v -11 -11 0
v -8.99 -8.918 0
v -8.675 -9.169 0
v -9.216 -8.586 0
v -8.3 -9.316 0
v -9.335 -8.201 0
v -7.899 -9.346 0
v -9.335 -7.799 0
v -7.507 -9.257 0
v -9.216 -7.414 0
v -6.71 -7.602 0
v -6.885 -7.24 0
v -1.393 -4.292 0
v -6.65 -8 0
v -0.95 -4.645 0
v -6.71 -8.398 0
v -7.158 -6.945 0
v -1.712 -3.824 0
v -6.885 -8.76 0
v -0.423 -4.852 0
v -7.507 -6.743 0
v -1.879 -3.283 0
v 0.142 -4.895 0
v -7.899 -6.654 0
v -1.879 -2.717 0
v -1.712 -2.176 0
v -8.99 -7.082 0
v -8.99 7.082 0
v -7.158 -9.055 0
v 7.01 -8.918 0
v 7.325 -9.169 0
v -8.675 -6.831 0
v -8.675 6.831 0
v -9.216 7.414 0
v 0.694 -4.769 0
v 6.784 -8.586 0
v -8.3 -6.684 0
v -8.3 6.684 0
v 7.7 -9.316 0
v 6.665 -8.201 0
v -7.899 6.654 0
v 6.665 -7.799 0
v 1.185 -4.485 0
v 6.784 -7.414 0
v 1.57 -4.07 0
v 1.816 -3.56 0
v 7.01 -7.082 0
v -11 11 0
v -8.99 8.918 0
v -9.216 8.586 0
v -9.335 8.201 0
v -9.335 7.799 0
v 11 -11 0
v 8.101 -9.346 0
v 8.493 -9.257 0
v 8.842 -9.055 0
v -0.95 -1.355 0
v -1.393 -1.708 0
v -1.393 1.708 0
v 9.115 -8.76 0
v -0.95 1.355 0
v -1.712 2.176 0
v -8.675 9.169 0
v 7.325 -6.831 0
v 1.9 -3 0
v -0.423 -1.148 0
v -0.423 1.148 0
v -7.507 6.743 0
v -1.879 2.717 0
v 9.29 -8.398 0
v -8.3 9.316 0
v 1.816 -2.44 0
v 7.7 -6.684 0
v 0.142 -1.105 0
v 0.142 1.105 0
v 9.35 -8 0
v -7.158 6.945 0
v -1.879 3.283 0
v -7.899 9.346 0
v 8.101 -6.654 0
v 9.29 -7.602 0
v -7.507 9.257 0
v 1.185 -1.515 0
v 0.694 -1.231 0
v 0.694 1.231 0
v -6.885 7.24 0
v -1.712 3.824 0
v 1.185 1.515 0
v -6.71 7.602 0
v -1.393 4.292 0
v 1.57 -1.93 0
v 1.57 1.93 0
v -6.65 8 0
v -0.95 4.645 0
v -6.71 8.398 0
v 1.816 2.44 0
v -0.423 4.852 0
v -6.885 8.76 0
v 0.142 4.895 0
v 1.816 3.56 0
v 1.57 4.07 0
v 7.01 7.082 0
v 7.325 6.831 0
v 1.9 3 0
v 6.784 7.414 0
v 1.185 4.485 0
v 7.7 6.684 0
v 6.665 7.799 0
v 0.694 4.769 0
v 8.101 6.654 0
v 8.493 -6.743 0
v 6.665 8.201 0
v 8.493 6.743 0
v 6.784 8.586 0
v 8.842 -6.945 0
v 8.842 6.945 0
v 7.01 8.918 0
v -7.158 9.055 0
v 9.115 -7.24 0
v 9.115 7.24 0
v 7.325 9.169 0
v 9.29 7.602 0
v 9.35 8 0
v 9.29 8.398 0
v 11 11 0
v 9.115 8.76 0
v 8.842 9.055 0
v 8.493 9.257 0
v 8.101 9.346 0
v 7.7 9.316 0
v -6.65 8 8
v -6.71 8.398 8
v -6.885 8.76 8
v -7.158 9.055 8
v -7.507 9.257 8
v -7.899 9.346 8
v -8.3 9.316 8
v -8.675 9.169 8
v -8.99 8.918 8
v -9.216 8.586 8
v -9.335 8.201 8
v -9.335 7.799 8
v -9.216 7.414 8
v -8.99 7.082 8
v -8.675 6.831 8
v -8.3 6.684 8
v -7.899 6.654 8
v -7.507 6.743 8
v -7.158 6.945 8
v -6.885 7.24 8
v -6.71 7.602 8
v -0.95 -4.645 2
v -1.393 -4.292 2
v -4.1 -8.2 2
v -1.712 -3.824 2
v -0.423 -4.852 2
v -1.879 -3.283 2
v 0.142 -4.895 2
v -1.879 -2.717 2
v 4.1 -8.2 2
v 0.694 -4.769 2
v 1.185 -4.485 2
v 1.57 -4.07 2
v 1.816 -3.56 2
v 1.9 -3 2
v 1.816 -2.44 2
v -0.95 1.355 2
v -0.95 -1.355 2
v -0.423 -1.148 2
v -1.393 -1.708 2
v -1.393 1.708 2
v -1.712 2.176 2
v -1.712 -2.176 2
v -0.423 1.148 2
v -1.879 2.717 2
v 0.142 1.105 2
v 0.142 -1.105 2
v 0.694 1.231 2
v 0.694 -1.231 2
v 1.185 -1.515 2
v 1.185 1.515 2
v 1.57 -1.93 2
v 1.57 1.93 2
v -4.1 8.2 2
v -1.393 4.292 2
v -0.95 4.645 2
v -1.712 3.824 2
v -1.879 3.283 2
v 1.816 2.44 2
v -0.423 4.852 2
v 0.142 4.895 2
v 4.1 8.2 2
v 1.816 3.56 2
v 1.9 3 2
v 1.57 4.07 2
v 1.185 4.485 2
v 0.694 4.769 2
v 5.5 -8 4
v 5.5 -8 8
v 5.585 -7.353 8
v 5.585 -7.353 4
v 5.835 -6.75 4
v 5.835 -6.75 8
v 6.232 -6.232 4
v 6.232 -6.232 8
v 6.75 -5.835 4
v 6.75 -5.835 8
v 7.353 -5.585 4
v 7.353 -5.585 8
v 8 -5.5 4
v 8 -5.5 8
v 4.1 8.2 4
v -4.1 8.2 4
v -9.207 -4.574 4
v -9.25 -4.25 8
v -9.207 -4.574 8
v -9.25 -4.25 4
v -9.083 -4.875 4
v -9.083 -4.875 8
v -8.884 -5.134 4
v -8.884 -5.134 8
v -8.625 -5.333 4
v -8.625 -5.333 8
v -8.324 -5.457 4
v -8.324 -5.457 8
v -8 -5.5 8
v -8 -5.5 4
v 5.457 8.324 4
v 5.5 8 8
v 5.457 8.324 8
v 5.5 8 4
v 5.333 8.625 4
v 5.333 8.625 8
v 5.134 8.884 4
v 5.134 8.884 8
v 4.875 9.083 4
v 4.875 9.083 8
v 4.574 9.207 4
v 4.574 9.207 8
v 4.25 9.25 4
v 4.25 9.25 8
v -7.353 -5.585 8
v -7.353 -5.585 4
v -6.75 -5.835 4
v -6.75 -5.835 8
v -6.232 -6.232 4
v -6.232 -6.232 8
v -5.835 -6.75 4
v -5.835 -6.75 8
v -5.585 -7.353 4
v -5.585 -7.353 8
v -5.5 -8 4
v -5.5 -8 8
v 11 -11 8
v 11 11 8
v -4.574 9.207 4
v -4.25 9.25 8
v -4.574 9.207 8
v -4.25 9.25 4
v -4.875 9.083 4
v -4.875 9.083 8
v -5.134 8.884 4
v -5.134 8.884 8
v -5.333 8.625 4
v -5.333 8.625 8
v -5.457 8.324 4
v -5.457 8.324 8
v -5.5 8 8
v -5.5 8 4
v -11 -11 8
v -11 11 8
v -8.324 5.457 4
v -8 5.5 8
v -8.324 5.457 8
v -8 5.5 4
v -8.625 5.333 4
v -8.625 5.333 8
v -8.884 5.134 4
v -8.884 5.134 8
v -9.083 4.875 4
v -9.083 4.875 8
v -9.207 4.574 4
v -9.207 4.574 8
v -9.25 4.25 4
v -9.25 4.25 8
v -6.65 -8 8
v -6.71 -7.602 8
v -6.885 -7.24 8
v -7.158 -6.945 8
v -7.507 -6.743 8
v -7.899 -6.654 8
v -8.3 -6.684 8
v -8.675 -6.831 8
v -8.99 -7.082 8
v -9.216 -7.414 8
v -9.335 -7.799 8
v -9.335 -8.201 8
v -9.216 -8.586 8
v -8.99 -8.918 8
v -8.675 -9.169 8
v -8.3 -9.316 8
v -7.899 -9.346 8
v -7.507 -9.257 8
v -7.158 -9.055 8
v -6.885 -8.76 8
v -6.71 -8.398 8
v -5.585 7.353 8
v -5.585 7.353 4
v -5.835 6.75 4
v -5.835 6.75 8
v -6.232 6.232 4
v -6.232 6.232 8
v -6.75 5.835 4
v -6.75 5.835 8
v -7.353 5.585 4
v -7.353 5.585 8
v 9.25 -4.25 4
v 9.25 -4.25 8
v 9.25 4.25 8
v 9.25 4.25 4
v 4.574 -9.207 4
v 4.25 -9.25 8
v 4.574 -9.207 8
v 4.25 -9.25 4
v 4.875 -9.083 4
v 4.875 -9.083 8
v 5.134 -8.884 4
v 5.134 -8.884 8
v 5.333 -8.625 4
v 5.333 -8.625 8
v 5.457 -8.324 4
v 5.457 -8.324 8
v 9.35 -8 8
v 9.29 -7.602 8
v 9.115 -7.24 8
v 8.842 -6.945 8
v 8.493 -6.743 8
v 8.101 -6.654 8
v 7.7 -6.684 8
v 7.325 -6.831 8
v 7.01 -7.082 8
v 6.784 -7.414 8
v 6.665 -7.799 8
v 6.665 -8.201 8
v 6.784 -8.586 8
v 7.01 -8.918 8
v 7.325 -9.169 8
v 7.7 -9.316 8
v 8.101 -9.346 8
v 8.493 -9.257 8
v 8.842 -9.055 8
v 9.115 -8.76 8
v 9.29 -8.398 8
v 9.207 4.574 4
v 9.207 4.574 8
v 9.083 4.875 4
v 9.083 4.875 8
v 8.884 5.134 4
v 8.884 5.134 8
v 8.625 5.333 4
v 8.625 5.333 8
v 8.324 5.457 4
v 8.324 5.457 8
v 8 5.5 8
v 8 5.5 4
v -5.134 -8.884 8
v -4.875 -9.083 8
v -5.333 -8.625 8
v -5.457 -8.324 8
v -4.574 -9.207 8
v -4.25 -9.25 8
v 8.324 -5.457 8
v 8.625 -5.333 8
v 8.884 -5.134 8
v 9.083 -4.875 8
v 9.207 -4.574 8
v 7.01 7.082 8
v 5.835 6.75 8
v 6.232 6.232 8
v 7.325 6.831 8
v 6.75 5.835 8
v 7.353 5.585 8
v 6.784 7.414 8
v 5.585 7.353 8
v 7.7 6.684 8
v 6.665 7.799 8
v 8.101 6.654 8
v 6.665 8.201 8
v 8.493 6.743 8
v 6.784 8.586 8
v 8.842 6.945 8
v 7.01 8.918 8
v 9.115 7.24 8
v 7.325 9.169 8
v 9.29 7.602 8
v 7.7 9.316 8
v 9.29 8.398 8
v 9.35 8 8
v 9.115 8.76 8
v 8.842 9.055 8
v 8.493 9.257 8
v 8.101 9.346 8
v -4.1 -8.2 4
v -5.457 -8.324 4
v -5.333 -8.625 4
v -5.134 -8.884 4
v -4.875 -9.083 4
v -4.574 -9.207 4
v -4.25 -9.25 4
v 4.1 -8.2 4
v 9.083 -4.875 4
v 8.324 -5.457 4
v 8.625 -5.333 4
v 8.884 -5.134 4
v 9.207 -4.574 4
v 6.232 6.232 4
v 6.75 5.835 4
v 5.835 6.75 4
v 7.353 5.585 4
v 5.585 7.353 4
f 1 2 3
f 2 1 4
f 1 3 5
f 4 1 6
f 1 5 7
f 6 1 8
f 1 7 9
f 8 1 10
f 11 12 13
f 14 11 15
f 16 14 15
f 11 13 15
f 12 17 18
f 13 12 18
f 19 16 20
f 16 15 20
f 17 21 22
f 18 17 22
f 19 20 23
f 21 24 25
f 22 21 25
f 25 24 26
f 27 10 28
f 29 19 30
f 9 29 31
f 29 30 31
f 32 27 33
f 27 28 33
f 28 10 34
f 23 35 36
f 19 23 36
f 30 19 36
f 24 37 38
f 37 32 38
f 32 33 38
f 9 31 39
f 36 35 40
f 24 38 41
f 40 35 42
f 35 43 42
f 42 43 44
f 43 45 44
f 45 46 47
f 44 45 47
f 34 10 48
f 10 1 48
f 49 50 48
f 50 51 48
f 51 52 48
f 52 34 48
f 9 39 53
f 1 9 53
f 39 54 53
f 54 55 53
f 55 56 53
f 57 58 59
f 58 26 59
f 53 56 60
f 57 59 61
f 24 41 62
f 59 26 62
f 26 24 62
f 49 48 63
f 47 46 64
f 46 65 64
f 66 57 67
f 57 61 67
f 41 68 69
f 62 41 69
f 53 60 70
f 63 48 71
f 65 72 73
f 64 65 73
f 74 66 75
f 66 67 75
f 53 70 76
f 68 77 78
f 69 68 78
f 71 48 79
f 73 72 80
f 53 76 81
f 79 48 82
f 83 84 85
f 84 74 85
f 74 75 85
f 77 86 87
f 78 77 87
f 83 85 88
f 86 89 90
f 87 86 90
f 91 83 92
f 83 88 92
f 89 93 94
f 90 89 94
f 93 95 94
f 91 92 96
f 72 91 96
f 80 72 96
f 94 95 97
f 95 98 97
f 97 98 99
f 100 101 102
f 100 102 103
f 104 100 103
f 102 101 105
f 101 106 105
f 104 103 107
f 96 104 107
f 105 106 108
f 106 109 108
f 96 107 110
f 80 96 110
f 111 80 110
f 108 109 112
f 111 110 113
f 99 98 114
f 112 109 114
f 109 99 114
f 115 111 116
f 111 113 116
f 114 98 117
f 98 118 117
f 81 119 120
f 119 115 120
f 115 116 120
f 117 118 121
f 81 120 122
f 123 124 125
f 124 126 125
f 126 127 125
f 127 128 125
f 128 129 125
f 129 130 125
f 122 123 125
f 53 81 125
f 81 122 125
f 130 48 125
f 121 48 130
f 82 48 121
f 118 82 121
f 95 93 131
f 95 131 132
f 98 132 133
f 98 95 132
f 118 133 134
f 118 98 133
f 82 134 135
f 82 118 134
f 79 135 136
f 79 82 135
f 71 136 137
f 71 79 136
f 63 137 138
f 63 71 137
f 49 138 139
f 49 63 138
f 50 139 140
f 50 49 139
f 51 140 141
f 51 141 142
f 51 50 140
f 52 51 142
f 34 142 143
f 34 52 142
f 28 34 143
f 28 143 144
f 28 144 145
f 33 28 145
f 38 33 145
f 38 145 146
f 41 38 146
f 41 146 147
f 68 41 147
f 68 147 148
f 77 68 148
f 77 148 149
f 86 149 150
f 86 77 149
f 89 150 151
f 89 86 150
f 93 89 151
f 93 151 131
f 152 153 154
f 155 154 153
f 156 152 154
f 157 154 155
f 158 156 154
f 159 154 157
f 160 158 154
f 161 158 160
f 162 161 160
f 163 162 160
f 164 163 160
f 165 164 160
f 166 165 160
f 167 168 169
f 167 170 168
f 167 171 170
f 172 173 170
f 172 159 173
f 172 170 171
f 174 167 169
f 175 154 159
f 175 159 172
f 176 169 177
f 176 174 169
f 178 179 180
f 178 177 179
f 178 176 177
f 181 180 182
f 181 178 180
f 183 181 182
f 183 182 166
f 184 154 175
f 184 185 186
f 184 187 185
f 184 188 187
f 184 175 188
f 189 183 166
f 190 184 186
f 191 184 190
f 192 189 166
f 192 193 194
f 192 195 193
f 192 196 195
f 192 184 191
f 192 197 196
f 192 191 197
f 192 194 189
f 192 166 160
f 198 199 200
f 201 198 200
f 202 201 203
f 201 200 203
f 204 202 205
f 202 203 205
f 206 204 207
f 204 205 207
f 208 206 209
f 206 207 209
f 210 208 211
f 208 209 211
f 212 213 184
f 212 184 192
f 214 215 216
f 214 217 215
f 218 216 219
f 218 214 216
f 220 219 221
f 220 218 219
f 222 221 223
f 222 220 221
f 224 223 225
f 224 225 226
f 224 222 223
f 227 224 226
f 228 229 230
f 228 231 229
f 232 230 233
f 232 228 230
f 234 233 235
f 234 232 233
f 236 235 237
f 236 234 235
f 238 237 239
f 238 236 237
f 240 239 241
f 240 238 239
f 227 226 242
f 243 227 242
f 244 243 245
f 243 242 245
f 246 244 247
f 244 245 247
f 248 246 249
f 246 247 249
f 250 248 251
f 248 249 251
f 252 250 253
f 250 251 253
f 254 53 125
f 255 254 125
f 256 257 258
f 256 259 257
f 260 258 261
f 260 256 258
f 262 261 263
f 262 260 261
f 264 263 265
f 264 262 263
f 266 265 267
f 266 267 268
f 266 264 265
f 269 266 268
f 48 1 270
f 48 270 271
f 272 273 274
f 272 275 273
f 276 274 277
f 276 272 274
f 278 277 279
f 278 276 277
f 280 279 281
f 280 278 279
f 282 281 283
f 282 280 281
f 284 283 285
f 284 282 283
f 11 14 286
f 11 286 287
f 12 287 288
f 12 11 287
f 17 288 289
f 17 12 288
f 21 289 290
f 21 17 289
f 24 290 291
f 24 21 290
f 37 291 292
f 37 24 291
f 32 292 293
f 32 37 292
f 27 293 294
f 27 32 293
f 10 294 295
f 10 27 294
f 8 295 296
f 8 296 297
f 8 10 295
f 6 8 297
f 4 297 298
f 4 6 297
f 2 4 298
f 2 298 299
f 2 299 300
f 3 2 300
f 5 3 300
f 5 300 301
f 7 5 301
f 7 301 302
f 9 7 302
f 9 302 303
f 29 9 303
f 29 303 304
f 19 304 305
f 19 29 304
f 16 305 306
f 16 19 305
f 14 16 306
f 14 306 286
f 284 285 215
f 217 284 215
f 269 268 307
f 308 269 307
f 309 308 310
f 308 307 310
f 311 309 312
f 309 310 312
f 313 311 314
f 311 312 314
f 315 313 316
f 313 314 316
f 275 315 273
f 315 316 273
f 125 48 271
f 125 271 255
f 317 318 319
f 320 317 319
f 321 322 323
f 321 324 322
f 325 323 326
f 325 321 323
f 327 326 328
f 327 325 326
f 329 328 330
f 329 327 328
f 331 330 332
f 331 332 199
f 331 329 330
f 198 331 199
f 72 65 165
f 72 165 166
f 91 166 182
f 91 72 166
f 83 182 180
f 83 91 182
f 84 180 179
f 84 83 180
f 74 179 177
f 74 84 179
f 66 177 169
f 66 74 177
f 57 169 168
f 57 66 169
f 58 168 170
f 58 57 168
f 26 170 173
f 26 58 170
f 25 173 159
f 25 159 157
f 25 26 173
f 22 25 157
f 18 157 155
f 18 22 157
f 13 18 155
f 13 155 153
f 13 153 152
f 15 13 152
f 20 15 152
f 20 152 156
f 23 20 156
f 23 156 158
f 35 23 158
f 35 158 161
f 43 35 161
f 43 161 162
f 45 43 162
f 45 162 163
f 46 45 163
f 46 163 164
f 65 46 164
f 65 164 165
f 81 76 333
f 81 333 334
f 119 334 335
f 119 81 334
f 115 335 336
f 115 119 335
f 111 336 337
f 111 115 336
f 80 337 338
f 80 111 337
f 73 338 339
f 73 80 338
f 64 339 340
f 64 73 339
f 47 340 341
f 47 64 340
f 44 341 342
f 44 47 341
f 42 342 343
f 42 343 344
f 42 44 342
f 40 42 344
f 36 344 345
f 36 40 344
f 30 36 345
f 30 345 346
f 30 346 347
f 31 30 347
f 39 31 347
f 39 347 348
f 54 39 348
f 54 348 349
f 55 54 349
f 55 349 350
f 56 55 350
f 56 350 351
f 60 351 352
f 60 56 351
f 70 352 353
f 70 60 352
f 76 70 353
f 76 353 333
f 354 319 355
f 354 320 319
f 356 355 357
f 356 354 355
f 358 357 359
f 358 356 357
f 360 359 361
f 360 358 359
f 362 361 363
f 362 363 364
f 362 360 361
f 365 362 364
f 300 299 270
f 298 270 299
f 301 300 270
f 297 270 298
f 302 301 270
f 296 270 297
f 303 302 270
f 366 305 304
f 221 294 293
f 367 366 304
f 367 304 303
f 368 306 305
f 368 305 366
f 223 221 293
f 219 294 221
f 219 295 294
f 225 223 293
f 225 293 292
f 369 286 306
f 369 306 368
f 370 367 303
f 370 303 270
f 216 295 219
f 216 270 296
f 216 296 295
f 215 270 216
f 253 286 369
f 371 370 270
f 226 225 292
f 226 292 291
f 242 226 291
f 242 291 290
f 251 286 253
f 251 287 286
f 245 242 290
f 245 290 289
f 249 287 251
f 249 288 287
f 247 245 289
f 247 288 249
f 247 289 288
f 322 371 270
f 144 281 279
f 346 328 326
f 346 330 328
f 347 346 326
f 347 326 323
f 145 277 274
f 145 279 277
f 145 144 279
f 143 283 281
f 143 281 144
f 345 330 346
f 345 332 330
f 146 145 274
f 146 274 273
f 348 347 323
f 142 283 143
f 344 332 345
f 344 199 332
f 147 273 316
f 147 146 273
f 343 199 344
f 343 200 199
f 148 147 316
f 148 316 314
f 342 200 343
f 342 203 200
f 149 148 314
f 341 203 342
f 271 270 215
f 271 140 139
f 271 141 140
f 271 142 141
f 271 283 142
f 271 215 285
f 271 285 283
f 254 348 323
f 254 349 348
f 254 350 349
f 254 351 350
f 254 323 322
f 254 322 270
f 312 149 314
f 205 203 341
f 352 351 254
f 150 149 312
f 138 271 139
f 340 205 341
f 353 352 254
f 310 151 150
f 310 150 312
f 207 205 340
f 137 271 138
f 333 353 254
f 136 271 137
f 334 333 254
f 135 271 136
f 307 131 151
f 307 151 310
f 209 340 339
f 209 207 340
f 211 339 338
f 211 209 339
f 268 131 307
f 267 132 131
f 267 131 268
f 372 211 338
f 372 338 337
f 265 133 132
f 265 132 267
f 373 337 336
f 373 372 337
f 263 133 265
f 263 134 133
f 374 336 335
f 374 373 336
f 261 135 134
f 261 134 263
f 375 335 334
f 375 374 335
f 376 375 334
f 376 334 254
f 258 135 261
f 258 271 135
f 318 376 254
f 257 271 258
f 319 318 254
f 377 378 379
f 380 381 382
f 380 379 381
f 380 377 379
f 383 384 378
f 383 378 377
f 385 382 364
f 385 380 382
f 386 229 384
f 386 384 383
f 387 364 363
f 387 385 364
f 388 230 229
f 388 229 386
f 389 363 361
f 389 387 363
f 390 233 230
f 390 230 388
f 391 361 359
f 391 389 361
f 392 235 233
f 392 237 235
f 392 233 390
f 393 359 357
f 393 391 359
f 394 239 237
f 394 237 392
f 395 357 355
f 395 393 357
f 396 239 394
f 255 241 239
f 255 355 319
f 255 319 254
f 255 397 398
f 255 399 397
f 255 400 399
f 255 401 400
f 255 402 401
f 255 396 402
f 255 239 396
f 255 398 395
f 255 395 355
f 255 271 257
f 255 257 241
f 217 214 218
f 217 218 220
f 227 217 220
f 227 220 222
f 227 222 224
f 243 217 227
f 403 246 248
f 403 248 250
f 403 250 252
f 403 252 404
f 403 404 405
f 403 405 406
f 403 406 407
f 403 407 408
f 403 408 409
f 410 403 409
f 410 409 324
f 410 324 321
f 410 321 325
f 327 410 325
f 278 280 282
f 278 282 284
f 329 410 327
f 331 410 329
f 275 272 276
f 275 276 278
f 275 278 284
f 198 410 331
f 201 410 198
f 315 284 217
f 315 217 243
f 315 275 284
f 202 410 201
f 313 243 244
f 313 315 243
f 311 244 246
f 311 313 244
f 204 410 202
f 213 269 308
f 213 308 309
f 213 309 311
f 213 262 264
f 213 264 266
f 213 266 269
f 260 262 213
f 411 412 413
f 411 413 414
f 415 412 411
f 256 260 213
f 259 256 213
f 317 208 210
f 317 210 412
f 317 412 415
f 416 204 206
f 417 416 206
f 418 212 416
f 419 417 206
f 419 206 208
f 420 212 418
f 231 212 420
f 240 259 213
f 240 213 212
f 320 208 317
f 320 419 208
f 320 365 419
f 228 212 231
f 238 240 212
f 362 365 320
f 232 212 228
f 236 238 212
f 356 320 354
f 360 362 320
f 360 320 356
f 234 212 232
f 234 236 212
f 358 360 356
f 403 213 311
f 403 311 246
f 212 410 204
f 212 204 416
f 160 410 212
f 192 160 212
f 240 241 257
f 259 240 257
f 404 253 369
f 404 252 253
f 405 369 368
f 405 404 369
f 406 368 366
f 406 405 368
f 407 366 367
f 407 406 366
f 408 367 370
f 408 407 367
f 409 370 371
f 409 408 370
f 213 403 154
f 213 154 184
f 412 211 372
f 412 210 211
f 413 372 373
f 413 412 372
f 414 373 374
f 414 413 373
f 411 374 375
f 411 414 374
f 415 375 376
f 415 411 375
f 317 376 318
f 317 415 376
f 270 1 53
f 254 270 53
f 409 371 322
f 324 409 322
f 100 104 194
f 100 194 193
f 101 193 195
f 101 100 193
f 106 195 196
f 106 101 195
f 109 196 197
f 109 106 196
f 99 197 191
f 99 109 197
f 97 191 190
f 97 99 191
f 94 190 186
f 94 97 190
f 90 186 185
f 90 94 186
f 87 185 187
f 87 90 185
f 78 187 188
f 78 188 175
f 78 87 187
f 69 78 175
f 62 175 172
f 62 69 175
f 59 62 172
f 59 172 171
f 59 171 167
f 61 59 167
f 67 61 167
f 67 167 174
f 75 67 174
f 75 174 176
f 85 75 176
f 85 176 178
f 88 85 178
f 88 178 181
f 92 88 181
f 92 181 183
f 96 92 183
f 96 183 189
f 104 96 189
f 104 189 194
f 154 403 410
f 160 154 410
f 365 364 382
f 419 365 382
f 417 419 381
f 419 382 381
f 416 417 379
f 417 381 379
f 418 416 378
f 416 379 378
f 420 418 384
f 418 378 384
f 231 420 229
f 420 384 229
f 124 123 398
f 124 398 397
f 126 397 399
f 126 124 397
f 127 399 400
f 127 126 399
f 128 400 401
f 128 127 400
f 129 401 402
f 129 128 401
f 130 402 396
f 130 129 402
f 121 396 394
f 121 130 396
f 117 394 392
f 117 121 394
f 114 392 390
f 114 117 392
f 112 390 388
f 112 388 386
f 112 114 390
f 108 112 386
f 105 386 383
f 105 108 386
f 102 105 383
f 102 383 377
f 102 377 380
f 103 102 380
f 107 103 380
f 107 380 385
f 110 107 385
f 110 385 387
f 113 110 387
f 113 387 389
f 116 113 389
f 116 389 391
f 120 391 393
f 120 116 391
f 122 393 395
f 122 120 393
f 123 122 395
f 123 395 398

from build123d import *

# Parameters (mm, degrees)
F0_W     = 22
F0_H     = 22
F0_R     = 1.35
F0_R_2   = 1.9
F1_DEPTH = 8
F2_W     = 8.2
F2_H     = 16.4
F2_R     = 1.9
F3_DEPTH = 6
F4_DEPTH = 4
F5_R     = 1.24999


# Not quite as in the source:
# - a fillet or chamfer is up to 0.001 mm smaller than in the source, because OpenCascade refuses the exact size


with BuildPart() as f1:
    # F0 (on Top) → F1 (new body)
    with BuildSketch(Plane.XY):
        Rectangle(F0_W, F0_H)
        with Locations((-8, -8)):
            Circle(F0_R, mode=Mode.SUBTRACT)
        with Locations((8, -8)):
            Circle(F0_R, mode=Mode.SUBTRACT)
        with Locations((0, -3)):
            Circle(F0_R_2, mode=Mode.SUBTRACT)
        with Locations((-8, 8)):
            Circle(F0_R, mode=Mode.SUBTRACT)
        with Locations((0, 3)):
            Circle(F0_R_2, mode=Mode.SUBTRACT)
        with Locations((8, 8)):
            Circle(F0_R, mode=Mode.SUBTRACT)
    extrude(amount=F1_DEPTH)

    # F2 (on face) → F3 (cut)
    with BuildSketch(Plane.XY.offset(8)):
        Rectangle(F2_W, F2_H)
        with Locations((0, -3)):
            Circle(F2_R, mode=Mode.SUBTRACT)
        with Locations((0, 3)):
            Circle(F2_R, mode=Mode.SUBTRACT)
    extrude(amount=-F3_DEPTH, mode=Mode.SUBTRACT)

    # F2 (on face) → F4 (cut)
    with BuildSketch(Plane.XY.offset(8)):
        with BuildLine():
            ThreePointArc((-5.5, 8), (-6.232233047, 6.232233047), (-8, 5.5))
            Line((-8, 5.5), (-9.25, 5.5))
            Line((-9.25, 5.5), (-9.25, -5.5))
            Line((-9.25, -5.5), (-8, -5.5))
            ThreePointArc((-8, -5.5), (-6.232233047, -6.232233047), (-5.5, -8))
            Line((-5.5, -8), (-5.5, -9.25))
            Line((-5.5, -9.25), (5.5, -9.25))
            Line((5.5, -9.25), (5.5, -8))
            ThreePointArc((5.5, -8), (6.232233047, -6.232233047), (8, -5.5))
            Line((8, -5.5), (9.25, -5.5))
            Line((9.25, -5.5), (9.25, 5.5))
            Line((9.25, 5.5), (8, 5.5))
            ThreePointArc((8, 5.5), (6.232233047, 6.232233047), (5.5, 8))
            Line((5.5, 8), (5.5, 9.25))
            Line((5.5, 9.25), (-5.5, 9.25))
            Line((-5.5, 9.25), (-5.5, 8))
        make_face()
        Rectangle(F2_W, F2_H, mode=Mode.SUBTRACT)
    extrude(amount=-F4_DEPTH, mode=Mode.SUBTRACT)

    # F5 (radius 1.25 in the source; OpenCascade refuses exactly that, so slightly less here)
    f5_edges = [f1.edges().sort_by_distance(p)[0] for p in [
        (-9.25, 5.5, 6),
        (-5.5, 9.25, 6),
        (5.5, 9.25, 6),
        (9.25, 5.5, 6),
        (-9.25, -5.5, 6),
        (-5.5, -9.25, 6),
        (5.5, -9.25, 6),
        (9.25, -5.5, 6),
    ]]
    fillet(f5_edges, radius=F5_R)


solid = f1.part
